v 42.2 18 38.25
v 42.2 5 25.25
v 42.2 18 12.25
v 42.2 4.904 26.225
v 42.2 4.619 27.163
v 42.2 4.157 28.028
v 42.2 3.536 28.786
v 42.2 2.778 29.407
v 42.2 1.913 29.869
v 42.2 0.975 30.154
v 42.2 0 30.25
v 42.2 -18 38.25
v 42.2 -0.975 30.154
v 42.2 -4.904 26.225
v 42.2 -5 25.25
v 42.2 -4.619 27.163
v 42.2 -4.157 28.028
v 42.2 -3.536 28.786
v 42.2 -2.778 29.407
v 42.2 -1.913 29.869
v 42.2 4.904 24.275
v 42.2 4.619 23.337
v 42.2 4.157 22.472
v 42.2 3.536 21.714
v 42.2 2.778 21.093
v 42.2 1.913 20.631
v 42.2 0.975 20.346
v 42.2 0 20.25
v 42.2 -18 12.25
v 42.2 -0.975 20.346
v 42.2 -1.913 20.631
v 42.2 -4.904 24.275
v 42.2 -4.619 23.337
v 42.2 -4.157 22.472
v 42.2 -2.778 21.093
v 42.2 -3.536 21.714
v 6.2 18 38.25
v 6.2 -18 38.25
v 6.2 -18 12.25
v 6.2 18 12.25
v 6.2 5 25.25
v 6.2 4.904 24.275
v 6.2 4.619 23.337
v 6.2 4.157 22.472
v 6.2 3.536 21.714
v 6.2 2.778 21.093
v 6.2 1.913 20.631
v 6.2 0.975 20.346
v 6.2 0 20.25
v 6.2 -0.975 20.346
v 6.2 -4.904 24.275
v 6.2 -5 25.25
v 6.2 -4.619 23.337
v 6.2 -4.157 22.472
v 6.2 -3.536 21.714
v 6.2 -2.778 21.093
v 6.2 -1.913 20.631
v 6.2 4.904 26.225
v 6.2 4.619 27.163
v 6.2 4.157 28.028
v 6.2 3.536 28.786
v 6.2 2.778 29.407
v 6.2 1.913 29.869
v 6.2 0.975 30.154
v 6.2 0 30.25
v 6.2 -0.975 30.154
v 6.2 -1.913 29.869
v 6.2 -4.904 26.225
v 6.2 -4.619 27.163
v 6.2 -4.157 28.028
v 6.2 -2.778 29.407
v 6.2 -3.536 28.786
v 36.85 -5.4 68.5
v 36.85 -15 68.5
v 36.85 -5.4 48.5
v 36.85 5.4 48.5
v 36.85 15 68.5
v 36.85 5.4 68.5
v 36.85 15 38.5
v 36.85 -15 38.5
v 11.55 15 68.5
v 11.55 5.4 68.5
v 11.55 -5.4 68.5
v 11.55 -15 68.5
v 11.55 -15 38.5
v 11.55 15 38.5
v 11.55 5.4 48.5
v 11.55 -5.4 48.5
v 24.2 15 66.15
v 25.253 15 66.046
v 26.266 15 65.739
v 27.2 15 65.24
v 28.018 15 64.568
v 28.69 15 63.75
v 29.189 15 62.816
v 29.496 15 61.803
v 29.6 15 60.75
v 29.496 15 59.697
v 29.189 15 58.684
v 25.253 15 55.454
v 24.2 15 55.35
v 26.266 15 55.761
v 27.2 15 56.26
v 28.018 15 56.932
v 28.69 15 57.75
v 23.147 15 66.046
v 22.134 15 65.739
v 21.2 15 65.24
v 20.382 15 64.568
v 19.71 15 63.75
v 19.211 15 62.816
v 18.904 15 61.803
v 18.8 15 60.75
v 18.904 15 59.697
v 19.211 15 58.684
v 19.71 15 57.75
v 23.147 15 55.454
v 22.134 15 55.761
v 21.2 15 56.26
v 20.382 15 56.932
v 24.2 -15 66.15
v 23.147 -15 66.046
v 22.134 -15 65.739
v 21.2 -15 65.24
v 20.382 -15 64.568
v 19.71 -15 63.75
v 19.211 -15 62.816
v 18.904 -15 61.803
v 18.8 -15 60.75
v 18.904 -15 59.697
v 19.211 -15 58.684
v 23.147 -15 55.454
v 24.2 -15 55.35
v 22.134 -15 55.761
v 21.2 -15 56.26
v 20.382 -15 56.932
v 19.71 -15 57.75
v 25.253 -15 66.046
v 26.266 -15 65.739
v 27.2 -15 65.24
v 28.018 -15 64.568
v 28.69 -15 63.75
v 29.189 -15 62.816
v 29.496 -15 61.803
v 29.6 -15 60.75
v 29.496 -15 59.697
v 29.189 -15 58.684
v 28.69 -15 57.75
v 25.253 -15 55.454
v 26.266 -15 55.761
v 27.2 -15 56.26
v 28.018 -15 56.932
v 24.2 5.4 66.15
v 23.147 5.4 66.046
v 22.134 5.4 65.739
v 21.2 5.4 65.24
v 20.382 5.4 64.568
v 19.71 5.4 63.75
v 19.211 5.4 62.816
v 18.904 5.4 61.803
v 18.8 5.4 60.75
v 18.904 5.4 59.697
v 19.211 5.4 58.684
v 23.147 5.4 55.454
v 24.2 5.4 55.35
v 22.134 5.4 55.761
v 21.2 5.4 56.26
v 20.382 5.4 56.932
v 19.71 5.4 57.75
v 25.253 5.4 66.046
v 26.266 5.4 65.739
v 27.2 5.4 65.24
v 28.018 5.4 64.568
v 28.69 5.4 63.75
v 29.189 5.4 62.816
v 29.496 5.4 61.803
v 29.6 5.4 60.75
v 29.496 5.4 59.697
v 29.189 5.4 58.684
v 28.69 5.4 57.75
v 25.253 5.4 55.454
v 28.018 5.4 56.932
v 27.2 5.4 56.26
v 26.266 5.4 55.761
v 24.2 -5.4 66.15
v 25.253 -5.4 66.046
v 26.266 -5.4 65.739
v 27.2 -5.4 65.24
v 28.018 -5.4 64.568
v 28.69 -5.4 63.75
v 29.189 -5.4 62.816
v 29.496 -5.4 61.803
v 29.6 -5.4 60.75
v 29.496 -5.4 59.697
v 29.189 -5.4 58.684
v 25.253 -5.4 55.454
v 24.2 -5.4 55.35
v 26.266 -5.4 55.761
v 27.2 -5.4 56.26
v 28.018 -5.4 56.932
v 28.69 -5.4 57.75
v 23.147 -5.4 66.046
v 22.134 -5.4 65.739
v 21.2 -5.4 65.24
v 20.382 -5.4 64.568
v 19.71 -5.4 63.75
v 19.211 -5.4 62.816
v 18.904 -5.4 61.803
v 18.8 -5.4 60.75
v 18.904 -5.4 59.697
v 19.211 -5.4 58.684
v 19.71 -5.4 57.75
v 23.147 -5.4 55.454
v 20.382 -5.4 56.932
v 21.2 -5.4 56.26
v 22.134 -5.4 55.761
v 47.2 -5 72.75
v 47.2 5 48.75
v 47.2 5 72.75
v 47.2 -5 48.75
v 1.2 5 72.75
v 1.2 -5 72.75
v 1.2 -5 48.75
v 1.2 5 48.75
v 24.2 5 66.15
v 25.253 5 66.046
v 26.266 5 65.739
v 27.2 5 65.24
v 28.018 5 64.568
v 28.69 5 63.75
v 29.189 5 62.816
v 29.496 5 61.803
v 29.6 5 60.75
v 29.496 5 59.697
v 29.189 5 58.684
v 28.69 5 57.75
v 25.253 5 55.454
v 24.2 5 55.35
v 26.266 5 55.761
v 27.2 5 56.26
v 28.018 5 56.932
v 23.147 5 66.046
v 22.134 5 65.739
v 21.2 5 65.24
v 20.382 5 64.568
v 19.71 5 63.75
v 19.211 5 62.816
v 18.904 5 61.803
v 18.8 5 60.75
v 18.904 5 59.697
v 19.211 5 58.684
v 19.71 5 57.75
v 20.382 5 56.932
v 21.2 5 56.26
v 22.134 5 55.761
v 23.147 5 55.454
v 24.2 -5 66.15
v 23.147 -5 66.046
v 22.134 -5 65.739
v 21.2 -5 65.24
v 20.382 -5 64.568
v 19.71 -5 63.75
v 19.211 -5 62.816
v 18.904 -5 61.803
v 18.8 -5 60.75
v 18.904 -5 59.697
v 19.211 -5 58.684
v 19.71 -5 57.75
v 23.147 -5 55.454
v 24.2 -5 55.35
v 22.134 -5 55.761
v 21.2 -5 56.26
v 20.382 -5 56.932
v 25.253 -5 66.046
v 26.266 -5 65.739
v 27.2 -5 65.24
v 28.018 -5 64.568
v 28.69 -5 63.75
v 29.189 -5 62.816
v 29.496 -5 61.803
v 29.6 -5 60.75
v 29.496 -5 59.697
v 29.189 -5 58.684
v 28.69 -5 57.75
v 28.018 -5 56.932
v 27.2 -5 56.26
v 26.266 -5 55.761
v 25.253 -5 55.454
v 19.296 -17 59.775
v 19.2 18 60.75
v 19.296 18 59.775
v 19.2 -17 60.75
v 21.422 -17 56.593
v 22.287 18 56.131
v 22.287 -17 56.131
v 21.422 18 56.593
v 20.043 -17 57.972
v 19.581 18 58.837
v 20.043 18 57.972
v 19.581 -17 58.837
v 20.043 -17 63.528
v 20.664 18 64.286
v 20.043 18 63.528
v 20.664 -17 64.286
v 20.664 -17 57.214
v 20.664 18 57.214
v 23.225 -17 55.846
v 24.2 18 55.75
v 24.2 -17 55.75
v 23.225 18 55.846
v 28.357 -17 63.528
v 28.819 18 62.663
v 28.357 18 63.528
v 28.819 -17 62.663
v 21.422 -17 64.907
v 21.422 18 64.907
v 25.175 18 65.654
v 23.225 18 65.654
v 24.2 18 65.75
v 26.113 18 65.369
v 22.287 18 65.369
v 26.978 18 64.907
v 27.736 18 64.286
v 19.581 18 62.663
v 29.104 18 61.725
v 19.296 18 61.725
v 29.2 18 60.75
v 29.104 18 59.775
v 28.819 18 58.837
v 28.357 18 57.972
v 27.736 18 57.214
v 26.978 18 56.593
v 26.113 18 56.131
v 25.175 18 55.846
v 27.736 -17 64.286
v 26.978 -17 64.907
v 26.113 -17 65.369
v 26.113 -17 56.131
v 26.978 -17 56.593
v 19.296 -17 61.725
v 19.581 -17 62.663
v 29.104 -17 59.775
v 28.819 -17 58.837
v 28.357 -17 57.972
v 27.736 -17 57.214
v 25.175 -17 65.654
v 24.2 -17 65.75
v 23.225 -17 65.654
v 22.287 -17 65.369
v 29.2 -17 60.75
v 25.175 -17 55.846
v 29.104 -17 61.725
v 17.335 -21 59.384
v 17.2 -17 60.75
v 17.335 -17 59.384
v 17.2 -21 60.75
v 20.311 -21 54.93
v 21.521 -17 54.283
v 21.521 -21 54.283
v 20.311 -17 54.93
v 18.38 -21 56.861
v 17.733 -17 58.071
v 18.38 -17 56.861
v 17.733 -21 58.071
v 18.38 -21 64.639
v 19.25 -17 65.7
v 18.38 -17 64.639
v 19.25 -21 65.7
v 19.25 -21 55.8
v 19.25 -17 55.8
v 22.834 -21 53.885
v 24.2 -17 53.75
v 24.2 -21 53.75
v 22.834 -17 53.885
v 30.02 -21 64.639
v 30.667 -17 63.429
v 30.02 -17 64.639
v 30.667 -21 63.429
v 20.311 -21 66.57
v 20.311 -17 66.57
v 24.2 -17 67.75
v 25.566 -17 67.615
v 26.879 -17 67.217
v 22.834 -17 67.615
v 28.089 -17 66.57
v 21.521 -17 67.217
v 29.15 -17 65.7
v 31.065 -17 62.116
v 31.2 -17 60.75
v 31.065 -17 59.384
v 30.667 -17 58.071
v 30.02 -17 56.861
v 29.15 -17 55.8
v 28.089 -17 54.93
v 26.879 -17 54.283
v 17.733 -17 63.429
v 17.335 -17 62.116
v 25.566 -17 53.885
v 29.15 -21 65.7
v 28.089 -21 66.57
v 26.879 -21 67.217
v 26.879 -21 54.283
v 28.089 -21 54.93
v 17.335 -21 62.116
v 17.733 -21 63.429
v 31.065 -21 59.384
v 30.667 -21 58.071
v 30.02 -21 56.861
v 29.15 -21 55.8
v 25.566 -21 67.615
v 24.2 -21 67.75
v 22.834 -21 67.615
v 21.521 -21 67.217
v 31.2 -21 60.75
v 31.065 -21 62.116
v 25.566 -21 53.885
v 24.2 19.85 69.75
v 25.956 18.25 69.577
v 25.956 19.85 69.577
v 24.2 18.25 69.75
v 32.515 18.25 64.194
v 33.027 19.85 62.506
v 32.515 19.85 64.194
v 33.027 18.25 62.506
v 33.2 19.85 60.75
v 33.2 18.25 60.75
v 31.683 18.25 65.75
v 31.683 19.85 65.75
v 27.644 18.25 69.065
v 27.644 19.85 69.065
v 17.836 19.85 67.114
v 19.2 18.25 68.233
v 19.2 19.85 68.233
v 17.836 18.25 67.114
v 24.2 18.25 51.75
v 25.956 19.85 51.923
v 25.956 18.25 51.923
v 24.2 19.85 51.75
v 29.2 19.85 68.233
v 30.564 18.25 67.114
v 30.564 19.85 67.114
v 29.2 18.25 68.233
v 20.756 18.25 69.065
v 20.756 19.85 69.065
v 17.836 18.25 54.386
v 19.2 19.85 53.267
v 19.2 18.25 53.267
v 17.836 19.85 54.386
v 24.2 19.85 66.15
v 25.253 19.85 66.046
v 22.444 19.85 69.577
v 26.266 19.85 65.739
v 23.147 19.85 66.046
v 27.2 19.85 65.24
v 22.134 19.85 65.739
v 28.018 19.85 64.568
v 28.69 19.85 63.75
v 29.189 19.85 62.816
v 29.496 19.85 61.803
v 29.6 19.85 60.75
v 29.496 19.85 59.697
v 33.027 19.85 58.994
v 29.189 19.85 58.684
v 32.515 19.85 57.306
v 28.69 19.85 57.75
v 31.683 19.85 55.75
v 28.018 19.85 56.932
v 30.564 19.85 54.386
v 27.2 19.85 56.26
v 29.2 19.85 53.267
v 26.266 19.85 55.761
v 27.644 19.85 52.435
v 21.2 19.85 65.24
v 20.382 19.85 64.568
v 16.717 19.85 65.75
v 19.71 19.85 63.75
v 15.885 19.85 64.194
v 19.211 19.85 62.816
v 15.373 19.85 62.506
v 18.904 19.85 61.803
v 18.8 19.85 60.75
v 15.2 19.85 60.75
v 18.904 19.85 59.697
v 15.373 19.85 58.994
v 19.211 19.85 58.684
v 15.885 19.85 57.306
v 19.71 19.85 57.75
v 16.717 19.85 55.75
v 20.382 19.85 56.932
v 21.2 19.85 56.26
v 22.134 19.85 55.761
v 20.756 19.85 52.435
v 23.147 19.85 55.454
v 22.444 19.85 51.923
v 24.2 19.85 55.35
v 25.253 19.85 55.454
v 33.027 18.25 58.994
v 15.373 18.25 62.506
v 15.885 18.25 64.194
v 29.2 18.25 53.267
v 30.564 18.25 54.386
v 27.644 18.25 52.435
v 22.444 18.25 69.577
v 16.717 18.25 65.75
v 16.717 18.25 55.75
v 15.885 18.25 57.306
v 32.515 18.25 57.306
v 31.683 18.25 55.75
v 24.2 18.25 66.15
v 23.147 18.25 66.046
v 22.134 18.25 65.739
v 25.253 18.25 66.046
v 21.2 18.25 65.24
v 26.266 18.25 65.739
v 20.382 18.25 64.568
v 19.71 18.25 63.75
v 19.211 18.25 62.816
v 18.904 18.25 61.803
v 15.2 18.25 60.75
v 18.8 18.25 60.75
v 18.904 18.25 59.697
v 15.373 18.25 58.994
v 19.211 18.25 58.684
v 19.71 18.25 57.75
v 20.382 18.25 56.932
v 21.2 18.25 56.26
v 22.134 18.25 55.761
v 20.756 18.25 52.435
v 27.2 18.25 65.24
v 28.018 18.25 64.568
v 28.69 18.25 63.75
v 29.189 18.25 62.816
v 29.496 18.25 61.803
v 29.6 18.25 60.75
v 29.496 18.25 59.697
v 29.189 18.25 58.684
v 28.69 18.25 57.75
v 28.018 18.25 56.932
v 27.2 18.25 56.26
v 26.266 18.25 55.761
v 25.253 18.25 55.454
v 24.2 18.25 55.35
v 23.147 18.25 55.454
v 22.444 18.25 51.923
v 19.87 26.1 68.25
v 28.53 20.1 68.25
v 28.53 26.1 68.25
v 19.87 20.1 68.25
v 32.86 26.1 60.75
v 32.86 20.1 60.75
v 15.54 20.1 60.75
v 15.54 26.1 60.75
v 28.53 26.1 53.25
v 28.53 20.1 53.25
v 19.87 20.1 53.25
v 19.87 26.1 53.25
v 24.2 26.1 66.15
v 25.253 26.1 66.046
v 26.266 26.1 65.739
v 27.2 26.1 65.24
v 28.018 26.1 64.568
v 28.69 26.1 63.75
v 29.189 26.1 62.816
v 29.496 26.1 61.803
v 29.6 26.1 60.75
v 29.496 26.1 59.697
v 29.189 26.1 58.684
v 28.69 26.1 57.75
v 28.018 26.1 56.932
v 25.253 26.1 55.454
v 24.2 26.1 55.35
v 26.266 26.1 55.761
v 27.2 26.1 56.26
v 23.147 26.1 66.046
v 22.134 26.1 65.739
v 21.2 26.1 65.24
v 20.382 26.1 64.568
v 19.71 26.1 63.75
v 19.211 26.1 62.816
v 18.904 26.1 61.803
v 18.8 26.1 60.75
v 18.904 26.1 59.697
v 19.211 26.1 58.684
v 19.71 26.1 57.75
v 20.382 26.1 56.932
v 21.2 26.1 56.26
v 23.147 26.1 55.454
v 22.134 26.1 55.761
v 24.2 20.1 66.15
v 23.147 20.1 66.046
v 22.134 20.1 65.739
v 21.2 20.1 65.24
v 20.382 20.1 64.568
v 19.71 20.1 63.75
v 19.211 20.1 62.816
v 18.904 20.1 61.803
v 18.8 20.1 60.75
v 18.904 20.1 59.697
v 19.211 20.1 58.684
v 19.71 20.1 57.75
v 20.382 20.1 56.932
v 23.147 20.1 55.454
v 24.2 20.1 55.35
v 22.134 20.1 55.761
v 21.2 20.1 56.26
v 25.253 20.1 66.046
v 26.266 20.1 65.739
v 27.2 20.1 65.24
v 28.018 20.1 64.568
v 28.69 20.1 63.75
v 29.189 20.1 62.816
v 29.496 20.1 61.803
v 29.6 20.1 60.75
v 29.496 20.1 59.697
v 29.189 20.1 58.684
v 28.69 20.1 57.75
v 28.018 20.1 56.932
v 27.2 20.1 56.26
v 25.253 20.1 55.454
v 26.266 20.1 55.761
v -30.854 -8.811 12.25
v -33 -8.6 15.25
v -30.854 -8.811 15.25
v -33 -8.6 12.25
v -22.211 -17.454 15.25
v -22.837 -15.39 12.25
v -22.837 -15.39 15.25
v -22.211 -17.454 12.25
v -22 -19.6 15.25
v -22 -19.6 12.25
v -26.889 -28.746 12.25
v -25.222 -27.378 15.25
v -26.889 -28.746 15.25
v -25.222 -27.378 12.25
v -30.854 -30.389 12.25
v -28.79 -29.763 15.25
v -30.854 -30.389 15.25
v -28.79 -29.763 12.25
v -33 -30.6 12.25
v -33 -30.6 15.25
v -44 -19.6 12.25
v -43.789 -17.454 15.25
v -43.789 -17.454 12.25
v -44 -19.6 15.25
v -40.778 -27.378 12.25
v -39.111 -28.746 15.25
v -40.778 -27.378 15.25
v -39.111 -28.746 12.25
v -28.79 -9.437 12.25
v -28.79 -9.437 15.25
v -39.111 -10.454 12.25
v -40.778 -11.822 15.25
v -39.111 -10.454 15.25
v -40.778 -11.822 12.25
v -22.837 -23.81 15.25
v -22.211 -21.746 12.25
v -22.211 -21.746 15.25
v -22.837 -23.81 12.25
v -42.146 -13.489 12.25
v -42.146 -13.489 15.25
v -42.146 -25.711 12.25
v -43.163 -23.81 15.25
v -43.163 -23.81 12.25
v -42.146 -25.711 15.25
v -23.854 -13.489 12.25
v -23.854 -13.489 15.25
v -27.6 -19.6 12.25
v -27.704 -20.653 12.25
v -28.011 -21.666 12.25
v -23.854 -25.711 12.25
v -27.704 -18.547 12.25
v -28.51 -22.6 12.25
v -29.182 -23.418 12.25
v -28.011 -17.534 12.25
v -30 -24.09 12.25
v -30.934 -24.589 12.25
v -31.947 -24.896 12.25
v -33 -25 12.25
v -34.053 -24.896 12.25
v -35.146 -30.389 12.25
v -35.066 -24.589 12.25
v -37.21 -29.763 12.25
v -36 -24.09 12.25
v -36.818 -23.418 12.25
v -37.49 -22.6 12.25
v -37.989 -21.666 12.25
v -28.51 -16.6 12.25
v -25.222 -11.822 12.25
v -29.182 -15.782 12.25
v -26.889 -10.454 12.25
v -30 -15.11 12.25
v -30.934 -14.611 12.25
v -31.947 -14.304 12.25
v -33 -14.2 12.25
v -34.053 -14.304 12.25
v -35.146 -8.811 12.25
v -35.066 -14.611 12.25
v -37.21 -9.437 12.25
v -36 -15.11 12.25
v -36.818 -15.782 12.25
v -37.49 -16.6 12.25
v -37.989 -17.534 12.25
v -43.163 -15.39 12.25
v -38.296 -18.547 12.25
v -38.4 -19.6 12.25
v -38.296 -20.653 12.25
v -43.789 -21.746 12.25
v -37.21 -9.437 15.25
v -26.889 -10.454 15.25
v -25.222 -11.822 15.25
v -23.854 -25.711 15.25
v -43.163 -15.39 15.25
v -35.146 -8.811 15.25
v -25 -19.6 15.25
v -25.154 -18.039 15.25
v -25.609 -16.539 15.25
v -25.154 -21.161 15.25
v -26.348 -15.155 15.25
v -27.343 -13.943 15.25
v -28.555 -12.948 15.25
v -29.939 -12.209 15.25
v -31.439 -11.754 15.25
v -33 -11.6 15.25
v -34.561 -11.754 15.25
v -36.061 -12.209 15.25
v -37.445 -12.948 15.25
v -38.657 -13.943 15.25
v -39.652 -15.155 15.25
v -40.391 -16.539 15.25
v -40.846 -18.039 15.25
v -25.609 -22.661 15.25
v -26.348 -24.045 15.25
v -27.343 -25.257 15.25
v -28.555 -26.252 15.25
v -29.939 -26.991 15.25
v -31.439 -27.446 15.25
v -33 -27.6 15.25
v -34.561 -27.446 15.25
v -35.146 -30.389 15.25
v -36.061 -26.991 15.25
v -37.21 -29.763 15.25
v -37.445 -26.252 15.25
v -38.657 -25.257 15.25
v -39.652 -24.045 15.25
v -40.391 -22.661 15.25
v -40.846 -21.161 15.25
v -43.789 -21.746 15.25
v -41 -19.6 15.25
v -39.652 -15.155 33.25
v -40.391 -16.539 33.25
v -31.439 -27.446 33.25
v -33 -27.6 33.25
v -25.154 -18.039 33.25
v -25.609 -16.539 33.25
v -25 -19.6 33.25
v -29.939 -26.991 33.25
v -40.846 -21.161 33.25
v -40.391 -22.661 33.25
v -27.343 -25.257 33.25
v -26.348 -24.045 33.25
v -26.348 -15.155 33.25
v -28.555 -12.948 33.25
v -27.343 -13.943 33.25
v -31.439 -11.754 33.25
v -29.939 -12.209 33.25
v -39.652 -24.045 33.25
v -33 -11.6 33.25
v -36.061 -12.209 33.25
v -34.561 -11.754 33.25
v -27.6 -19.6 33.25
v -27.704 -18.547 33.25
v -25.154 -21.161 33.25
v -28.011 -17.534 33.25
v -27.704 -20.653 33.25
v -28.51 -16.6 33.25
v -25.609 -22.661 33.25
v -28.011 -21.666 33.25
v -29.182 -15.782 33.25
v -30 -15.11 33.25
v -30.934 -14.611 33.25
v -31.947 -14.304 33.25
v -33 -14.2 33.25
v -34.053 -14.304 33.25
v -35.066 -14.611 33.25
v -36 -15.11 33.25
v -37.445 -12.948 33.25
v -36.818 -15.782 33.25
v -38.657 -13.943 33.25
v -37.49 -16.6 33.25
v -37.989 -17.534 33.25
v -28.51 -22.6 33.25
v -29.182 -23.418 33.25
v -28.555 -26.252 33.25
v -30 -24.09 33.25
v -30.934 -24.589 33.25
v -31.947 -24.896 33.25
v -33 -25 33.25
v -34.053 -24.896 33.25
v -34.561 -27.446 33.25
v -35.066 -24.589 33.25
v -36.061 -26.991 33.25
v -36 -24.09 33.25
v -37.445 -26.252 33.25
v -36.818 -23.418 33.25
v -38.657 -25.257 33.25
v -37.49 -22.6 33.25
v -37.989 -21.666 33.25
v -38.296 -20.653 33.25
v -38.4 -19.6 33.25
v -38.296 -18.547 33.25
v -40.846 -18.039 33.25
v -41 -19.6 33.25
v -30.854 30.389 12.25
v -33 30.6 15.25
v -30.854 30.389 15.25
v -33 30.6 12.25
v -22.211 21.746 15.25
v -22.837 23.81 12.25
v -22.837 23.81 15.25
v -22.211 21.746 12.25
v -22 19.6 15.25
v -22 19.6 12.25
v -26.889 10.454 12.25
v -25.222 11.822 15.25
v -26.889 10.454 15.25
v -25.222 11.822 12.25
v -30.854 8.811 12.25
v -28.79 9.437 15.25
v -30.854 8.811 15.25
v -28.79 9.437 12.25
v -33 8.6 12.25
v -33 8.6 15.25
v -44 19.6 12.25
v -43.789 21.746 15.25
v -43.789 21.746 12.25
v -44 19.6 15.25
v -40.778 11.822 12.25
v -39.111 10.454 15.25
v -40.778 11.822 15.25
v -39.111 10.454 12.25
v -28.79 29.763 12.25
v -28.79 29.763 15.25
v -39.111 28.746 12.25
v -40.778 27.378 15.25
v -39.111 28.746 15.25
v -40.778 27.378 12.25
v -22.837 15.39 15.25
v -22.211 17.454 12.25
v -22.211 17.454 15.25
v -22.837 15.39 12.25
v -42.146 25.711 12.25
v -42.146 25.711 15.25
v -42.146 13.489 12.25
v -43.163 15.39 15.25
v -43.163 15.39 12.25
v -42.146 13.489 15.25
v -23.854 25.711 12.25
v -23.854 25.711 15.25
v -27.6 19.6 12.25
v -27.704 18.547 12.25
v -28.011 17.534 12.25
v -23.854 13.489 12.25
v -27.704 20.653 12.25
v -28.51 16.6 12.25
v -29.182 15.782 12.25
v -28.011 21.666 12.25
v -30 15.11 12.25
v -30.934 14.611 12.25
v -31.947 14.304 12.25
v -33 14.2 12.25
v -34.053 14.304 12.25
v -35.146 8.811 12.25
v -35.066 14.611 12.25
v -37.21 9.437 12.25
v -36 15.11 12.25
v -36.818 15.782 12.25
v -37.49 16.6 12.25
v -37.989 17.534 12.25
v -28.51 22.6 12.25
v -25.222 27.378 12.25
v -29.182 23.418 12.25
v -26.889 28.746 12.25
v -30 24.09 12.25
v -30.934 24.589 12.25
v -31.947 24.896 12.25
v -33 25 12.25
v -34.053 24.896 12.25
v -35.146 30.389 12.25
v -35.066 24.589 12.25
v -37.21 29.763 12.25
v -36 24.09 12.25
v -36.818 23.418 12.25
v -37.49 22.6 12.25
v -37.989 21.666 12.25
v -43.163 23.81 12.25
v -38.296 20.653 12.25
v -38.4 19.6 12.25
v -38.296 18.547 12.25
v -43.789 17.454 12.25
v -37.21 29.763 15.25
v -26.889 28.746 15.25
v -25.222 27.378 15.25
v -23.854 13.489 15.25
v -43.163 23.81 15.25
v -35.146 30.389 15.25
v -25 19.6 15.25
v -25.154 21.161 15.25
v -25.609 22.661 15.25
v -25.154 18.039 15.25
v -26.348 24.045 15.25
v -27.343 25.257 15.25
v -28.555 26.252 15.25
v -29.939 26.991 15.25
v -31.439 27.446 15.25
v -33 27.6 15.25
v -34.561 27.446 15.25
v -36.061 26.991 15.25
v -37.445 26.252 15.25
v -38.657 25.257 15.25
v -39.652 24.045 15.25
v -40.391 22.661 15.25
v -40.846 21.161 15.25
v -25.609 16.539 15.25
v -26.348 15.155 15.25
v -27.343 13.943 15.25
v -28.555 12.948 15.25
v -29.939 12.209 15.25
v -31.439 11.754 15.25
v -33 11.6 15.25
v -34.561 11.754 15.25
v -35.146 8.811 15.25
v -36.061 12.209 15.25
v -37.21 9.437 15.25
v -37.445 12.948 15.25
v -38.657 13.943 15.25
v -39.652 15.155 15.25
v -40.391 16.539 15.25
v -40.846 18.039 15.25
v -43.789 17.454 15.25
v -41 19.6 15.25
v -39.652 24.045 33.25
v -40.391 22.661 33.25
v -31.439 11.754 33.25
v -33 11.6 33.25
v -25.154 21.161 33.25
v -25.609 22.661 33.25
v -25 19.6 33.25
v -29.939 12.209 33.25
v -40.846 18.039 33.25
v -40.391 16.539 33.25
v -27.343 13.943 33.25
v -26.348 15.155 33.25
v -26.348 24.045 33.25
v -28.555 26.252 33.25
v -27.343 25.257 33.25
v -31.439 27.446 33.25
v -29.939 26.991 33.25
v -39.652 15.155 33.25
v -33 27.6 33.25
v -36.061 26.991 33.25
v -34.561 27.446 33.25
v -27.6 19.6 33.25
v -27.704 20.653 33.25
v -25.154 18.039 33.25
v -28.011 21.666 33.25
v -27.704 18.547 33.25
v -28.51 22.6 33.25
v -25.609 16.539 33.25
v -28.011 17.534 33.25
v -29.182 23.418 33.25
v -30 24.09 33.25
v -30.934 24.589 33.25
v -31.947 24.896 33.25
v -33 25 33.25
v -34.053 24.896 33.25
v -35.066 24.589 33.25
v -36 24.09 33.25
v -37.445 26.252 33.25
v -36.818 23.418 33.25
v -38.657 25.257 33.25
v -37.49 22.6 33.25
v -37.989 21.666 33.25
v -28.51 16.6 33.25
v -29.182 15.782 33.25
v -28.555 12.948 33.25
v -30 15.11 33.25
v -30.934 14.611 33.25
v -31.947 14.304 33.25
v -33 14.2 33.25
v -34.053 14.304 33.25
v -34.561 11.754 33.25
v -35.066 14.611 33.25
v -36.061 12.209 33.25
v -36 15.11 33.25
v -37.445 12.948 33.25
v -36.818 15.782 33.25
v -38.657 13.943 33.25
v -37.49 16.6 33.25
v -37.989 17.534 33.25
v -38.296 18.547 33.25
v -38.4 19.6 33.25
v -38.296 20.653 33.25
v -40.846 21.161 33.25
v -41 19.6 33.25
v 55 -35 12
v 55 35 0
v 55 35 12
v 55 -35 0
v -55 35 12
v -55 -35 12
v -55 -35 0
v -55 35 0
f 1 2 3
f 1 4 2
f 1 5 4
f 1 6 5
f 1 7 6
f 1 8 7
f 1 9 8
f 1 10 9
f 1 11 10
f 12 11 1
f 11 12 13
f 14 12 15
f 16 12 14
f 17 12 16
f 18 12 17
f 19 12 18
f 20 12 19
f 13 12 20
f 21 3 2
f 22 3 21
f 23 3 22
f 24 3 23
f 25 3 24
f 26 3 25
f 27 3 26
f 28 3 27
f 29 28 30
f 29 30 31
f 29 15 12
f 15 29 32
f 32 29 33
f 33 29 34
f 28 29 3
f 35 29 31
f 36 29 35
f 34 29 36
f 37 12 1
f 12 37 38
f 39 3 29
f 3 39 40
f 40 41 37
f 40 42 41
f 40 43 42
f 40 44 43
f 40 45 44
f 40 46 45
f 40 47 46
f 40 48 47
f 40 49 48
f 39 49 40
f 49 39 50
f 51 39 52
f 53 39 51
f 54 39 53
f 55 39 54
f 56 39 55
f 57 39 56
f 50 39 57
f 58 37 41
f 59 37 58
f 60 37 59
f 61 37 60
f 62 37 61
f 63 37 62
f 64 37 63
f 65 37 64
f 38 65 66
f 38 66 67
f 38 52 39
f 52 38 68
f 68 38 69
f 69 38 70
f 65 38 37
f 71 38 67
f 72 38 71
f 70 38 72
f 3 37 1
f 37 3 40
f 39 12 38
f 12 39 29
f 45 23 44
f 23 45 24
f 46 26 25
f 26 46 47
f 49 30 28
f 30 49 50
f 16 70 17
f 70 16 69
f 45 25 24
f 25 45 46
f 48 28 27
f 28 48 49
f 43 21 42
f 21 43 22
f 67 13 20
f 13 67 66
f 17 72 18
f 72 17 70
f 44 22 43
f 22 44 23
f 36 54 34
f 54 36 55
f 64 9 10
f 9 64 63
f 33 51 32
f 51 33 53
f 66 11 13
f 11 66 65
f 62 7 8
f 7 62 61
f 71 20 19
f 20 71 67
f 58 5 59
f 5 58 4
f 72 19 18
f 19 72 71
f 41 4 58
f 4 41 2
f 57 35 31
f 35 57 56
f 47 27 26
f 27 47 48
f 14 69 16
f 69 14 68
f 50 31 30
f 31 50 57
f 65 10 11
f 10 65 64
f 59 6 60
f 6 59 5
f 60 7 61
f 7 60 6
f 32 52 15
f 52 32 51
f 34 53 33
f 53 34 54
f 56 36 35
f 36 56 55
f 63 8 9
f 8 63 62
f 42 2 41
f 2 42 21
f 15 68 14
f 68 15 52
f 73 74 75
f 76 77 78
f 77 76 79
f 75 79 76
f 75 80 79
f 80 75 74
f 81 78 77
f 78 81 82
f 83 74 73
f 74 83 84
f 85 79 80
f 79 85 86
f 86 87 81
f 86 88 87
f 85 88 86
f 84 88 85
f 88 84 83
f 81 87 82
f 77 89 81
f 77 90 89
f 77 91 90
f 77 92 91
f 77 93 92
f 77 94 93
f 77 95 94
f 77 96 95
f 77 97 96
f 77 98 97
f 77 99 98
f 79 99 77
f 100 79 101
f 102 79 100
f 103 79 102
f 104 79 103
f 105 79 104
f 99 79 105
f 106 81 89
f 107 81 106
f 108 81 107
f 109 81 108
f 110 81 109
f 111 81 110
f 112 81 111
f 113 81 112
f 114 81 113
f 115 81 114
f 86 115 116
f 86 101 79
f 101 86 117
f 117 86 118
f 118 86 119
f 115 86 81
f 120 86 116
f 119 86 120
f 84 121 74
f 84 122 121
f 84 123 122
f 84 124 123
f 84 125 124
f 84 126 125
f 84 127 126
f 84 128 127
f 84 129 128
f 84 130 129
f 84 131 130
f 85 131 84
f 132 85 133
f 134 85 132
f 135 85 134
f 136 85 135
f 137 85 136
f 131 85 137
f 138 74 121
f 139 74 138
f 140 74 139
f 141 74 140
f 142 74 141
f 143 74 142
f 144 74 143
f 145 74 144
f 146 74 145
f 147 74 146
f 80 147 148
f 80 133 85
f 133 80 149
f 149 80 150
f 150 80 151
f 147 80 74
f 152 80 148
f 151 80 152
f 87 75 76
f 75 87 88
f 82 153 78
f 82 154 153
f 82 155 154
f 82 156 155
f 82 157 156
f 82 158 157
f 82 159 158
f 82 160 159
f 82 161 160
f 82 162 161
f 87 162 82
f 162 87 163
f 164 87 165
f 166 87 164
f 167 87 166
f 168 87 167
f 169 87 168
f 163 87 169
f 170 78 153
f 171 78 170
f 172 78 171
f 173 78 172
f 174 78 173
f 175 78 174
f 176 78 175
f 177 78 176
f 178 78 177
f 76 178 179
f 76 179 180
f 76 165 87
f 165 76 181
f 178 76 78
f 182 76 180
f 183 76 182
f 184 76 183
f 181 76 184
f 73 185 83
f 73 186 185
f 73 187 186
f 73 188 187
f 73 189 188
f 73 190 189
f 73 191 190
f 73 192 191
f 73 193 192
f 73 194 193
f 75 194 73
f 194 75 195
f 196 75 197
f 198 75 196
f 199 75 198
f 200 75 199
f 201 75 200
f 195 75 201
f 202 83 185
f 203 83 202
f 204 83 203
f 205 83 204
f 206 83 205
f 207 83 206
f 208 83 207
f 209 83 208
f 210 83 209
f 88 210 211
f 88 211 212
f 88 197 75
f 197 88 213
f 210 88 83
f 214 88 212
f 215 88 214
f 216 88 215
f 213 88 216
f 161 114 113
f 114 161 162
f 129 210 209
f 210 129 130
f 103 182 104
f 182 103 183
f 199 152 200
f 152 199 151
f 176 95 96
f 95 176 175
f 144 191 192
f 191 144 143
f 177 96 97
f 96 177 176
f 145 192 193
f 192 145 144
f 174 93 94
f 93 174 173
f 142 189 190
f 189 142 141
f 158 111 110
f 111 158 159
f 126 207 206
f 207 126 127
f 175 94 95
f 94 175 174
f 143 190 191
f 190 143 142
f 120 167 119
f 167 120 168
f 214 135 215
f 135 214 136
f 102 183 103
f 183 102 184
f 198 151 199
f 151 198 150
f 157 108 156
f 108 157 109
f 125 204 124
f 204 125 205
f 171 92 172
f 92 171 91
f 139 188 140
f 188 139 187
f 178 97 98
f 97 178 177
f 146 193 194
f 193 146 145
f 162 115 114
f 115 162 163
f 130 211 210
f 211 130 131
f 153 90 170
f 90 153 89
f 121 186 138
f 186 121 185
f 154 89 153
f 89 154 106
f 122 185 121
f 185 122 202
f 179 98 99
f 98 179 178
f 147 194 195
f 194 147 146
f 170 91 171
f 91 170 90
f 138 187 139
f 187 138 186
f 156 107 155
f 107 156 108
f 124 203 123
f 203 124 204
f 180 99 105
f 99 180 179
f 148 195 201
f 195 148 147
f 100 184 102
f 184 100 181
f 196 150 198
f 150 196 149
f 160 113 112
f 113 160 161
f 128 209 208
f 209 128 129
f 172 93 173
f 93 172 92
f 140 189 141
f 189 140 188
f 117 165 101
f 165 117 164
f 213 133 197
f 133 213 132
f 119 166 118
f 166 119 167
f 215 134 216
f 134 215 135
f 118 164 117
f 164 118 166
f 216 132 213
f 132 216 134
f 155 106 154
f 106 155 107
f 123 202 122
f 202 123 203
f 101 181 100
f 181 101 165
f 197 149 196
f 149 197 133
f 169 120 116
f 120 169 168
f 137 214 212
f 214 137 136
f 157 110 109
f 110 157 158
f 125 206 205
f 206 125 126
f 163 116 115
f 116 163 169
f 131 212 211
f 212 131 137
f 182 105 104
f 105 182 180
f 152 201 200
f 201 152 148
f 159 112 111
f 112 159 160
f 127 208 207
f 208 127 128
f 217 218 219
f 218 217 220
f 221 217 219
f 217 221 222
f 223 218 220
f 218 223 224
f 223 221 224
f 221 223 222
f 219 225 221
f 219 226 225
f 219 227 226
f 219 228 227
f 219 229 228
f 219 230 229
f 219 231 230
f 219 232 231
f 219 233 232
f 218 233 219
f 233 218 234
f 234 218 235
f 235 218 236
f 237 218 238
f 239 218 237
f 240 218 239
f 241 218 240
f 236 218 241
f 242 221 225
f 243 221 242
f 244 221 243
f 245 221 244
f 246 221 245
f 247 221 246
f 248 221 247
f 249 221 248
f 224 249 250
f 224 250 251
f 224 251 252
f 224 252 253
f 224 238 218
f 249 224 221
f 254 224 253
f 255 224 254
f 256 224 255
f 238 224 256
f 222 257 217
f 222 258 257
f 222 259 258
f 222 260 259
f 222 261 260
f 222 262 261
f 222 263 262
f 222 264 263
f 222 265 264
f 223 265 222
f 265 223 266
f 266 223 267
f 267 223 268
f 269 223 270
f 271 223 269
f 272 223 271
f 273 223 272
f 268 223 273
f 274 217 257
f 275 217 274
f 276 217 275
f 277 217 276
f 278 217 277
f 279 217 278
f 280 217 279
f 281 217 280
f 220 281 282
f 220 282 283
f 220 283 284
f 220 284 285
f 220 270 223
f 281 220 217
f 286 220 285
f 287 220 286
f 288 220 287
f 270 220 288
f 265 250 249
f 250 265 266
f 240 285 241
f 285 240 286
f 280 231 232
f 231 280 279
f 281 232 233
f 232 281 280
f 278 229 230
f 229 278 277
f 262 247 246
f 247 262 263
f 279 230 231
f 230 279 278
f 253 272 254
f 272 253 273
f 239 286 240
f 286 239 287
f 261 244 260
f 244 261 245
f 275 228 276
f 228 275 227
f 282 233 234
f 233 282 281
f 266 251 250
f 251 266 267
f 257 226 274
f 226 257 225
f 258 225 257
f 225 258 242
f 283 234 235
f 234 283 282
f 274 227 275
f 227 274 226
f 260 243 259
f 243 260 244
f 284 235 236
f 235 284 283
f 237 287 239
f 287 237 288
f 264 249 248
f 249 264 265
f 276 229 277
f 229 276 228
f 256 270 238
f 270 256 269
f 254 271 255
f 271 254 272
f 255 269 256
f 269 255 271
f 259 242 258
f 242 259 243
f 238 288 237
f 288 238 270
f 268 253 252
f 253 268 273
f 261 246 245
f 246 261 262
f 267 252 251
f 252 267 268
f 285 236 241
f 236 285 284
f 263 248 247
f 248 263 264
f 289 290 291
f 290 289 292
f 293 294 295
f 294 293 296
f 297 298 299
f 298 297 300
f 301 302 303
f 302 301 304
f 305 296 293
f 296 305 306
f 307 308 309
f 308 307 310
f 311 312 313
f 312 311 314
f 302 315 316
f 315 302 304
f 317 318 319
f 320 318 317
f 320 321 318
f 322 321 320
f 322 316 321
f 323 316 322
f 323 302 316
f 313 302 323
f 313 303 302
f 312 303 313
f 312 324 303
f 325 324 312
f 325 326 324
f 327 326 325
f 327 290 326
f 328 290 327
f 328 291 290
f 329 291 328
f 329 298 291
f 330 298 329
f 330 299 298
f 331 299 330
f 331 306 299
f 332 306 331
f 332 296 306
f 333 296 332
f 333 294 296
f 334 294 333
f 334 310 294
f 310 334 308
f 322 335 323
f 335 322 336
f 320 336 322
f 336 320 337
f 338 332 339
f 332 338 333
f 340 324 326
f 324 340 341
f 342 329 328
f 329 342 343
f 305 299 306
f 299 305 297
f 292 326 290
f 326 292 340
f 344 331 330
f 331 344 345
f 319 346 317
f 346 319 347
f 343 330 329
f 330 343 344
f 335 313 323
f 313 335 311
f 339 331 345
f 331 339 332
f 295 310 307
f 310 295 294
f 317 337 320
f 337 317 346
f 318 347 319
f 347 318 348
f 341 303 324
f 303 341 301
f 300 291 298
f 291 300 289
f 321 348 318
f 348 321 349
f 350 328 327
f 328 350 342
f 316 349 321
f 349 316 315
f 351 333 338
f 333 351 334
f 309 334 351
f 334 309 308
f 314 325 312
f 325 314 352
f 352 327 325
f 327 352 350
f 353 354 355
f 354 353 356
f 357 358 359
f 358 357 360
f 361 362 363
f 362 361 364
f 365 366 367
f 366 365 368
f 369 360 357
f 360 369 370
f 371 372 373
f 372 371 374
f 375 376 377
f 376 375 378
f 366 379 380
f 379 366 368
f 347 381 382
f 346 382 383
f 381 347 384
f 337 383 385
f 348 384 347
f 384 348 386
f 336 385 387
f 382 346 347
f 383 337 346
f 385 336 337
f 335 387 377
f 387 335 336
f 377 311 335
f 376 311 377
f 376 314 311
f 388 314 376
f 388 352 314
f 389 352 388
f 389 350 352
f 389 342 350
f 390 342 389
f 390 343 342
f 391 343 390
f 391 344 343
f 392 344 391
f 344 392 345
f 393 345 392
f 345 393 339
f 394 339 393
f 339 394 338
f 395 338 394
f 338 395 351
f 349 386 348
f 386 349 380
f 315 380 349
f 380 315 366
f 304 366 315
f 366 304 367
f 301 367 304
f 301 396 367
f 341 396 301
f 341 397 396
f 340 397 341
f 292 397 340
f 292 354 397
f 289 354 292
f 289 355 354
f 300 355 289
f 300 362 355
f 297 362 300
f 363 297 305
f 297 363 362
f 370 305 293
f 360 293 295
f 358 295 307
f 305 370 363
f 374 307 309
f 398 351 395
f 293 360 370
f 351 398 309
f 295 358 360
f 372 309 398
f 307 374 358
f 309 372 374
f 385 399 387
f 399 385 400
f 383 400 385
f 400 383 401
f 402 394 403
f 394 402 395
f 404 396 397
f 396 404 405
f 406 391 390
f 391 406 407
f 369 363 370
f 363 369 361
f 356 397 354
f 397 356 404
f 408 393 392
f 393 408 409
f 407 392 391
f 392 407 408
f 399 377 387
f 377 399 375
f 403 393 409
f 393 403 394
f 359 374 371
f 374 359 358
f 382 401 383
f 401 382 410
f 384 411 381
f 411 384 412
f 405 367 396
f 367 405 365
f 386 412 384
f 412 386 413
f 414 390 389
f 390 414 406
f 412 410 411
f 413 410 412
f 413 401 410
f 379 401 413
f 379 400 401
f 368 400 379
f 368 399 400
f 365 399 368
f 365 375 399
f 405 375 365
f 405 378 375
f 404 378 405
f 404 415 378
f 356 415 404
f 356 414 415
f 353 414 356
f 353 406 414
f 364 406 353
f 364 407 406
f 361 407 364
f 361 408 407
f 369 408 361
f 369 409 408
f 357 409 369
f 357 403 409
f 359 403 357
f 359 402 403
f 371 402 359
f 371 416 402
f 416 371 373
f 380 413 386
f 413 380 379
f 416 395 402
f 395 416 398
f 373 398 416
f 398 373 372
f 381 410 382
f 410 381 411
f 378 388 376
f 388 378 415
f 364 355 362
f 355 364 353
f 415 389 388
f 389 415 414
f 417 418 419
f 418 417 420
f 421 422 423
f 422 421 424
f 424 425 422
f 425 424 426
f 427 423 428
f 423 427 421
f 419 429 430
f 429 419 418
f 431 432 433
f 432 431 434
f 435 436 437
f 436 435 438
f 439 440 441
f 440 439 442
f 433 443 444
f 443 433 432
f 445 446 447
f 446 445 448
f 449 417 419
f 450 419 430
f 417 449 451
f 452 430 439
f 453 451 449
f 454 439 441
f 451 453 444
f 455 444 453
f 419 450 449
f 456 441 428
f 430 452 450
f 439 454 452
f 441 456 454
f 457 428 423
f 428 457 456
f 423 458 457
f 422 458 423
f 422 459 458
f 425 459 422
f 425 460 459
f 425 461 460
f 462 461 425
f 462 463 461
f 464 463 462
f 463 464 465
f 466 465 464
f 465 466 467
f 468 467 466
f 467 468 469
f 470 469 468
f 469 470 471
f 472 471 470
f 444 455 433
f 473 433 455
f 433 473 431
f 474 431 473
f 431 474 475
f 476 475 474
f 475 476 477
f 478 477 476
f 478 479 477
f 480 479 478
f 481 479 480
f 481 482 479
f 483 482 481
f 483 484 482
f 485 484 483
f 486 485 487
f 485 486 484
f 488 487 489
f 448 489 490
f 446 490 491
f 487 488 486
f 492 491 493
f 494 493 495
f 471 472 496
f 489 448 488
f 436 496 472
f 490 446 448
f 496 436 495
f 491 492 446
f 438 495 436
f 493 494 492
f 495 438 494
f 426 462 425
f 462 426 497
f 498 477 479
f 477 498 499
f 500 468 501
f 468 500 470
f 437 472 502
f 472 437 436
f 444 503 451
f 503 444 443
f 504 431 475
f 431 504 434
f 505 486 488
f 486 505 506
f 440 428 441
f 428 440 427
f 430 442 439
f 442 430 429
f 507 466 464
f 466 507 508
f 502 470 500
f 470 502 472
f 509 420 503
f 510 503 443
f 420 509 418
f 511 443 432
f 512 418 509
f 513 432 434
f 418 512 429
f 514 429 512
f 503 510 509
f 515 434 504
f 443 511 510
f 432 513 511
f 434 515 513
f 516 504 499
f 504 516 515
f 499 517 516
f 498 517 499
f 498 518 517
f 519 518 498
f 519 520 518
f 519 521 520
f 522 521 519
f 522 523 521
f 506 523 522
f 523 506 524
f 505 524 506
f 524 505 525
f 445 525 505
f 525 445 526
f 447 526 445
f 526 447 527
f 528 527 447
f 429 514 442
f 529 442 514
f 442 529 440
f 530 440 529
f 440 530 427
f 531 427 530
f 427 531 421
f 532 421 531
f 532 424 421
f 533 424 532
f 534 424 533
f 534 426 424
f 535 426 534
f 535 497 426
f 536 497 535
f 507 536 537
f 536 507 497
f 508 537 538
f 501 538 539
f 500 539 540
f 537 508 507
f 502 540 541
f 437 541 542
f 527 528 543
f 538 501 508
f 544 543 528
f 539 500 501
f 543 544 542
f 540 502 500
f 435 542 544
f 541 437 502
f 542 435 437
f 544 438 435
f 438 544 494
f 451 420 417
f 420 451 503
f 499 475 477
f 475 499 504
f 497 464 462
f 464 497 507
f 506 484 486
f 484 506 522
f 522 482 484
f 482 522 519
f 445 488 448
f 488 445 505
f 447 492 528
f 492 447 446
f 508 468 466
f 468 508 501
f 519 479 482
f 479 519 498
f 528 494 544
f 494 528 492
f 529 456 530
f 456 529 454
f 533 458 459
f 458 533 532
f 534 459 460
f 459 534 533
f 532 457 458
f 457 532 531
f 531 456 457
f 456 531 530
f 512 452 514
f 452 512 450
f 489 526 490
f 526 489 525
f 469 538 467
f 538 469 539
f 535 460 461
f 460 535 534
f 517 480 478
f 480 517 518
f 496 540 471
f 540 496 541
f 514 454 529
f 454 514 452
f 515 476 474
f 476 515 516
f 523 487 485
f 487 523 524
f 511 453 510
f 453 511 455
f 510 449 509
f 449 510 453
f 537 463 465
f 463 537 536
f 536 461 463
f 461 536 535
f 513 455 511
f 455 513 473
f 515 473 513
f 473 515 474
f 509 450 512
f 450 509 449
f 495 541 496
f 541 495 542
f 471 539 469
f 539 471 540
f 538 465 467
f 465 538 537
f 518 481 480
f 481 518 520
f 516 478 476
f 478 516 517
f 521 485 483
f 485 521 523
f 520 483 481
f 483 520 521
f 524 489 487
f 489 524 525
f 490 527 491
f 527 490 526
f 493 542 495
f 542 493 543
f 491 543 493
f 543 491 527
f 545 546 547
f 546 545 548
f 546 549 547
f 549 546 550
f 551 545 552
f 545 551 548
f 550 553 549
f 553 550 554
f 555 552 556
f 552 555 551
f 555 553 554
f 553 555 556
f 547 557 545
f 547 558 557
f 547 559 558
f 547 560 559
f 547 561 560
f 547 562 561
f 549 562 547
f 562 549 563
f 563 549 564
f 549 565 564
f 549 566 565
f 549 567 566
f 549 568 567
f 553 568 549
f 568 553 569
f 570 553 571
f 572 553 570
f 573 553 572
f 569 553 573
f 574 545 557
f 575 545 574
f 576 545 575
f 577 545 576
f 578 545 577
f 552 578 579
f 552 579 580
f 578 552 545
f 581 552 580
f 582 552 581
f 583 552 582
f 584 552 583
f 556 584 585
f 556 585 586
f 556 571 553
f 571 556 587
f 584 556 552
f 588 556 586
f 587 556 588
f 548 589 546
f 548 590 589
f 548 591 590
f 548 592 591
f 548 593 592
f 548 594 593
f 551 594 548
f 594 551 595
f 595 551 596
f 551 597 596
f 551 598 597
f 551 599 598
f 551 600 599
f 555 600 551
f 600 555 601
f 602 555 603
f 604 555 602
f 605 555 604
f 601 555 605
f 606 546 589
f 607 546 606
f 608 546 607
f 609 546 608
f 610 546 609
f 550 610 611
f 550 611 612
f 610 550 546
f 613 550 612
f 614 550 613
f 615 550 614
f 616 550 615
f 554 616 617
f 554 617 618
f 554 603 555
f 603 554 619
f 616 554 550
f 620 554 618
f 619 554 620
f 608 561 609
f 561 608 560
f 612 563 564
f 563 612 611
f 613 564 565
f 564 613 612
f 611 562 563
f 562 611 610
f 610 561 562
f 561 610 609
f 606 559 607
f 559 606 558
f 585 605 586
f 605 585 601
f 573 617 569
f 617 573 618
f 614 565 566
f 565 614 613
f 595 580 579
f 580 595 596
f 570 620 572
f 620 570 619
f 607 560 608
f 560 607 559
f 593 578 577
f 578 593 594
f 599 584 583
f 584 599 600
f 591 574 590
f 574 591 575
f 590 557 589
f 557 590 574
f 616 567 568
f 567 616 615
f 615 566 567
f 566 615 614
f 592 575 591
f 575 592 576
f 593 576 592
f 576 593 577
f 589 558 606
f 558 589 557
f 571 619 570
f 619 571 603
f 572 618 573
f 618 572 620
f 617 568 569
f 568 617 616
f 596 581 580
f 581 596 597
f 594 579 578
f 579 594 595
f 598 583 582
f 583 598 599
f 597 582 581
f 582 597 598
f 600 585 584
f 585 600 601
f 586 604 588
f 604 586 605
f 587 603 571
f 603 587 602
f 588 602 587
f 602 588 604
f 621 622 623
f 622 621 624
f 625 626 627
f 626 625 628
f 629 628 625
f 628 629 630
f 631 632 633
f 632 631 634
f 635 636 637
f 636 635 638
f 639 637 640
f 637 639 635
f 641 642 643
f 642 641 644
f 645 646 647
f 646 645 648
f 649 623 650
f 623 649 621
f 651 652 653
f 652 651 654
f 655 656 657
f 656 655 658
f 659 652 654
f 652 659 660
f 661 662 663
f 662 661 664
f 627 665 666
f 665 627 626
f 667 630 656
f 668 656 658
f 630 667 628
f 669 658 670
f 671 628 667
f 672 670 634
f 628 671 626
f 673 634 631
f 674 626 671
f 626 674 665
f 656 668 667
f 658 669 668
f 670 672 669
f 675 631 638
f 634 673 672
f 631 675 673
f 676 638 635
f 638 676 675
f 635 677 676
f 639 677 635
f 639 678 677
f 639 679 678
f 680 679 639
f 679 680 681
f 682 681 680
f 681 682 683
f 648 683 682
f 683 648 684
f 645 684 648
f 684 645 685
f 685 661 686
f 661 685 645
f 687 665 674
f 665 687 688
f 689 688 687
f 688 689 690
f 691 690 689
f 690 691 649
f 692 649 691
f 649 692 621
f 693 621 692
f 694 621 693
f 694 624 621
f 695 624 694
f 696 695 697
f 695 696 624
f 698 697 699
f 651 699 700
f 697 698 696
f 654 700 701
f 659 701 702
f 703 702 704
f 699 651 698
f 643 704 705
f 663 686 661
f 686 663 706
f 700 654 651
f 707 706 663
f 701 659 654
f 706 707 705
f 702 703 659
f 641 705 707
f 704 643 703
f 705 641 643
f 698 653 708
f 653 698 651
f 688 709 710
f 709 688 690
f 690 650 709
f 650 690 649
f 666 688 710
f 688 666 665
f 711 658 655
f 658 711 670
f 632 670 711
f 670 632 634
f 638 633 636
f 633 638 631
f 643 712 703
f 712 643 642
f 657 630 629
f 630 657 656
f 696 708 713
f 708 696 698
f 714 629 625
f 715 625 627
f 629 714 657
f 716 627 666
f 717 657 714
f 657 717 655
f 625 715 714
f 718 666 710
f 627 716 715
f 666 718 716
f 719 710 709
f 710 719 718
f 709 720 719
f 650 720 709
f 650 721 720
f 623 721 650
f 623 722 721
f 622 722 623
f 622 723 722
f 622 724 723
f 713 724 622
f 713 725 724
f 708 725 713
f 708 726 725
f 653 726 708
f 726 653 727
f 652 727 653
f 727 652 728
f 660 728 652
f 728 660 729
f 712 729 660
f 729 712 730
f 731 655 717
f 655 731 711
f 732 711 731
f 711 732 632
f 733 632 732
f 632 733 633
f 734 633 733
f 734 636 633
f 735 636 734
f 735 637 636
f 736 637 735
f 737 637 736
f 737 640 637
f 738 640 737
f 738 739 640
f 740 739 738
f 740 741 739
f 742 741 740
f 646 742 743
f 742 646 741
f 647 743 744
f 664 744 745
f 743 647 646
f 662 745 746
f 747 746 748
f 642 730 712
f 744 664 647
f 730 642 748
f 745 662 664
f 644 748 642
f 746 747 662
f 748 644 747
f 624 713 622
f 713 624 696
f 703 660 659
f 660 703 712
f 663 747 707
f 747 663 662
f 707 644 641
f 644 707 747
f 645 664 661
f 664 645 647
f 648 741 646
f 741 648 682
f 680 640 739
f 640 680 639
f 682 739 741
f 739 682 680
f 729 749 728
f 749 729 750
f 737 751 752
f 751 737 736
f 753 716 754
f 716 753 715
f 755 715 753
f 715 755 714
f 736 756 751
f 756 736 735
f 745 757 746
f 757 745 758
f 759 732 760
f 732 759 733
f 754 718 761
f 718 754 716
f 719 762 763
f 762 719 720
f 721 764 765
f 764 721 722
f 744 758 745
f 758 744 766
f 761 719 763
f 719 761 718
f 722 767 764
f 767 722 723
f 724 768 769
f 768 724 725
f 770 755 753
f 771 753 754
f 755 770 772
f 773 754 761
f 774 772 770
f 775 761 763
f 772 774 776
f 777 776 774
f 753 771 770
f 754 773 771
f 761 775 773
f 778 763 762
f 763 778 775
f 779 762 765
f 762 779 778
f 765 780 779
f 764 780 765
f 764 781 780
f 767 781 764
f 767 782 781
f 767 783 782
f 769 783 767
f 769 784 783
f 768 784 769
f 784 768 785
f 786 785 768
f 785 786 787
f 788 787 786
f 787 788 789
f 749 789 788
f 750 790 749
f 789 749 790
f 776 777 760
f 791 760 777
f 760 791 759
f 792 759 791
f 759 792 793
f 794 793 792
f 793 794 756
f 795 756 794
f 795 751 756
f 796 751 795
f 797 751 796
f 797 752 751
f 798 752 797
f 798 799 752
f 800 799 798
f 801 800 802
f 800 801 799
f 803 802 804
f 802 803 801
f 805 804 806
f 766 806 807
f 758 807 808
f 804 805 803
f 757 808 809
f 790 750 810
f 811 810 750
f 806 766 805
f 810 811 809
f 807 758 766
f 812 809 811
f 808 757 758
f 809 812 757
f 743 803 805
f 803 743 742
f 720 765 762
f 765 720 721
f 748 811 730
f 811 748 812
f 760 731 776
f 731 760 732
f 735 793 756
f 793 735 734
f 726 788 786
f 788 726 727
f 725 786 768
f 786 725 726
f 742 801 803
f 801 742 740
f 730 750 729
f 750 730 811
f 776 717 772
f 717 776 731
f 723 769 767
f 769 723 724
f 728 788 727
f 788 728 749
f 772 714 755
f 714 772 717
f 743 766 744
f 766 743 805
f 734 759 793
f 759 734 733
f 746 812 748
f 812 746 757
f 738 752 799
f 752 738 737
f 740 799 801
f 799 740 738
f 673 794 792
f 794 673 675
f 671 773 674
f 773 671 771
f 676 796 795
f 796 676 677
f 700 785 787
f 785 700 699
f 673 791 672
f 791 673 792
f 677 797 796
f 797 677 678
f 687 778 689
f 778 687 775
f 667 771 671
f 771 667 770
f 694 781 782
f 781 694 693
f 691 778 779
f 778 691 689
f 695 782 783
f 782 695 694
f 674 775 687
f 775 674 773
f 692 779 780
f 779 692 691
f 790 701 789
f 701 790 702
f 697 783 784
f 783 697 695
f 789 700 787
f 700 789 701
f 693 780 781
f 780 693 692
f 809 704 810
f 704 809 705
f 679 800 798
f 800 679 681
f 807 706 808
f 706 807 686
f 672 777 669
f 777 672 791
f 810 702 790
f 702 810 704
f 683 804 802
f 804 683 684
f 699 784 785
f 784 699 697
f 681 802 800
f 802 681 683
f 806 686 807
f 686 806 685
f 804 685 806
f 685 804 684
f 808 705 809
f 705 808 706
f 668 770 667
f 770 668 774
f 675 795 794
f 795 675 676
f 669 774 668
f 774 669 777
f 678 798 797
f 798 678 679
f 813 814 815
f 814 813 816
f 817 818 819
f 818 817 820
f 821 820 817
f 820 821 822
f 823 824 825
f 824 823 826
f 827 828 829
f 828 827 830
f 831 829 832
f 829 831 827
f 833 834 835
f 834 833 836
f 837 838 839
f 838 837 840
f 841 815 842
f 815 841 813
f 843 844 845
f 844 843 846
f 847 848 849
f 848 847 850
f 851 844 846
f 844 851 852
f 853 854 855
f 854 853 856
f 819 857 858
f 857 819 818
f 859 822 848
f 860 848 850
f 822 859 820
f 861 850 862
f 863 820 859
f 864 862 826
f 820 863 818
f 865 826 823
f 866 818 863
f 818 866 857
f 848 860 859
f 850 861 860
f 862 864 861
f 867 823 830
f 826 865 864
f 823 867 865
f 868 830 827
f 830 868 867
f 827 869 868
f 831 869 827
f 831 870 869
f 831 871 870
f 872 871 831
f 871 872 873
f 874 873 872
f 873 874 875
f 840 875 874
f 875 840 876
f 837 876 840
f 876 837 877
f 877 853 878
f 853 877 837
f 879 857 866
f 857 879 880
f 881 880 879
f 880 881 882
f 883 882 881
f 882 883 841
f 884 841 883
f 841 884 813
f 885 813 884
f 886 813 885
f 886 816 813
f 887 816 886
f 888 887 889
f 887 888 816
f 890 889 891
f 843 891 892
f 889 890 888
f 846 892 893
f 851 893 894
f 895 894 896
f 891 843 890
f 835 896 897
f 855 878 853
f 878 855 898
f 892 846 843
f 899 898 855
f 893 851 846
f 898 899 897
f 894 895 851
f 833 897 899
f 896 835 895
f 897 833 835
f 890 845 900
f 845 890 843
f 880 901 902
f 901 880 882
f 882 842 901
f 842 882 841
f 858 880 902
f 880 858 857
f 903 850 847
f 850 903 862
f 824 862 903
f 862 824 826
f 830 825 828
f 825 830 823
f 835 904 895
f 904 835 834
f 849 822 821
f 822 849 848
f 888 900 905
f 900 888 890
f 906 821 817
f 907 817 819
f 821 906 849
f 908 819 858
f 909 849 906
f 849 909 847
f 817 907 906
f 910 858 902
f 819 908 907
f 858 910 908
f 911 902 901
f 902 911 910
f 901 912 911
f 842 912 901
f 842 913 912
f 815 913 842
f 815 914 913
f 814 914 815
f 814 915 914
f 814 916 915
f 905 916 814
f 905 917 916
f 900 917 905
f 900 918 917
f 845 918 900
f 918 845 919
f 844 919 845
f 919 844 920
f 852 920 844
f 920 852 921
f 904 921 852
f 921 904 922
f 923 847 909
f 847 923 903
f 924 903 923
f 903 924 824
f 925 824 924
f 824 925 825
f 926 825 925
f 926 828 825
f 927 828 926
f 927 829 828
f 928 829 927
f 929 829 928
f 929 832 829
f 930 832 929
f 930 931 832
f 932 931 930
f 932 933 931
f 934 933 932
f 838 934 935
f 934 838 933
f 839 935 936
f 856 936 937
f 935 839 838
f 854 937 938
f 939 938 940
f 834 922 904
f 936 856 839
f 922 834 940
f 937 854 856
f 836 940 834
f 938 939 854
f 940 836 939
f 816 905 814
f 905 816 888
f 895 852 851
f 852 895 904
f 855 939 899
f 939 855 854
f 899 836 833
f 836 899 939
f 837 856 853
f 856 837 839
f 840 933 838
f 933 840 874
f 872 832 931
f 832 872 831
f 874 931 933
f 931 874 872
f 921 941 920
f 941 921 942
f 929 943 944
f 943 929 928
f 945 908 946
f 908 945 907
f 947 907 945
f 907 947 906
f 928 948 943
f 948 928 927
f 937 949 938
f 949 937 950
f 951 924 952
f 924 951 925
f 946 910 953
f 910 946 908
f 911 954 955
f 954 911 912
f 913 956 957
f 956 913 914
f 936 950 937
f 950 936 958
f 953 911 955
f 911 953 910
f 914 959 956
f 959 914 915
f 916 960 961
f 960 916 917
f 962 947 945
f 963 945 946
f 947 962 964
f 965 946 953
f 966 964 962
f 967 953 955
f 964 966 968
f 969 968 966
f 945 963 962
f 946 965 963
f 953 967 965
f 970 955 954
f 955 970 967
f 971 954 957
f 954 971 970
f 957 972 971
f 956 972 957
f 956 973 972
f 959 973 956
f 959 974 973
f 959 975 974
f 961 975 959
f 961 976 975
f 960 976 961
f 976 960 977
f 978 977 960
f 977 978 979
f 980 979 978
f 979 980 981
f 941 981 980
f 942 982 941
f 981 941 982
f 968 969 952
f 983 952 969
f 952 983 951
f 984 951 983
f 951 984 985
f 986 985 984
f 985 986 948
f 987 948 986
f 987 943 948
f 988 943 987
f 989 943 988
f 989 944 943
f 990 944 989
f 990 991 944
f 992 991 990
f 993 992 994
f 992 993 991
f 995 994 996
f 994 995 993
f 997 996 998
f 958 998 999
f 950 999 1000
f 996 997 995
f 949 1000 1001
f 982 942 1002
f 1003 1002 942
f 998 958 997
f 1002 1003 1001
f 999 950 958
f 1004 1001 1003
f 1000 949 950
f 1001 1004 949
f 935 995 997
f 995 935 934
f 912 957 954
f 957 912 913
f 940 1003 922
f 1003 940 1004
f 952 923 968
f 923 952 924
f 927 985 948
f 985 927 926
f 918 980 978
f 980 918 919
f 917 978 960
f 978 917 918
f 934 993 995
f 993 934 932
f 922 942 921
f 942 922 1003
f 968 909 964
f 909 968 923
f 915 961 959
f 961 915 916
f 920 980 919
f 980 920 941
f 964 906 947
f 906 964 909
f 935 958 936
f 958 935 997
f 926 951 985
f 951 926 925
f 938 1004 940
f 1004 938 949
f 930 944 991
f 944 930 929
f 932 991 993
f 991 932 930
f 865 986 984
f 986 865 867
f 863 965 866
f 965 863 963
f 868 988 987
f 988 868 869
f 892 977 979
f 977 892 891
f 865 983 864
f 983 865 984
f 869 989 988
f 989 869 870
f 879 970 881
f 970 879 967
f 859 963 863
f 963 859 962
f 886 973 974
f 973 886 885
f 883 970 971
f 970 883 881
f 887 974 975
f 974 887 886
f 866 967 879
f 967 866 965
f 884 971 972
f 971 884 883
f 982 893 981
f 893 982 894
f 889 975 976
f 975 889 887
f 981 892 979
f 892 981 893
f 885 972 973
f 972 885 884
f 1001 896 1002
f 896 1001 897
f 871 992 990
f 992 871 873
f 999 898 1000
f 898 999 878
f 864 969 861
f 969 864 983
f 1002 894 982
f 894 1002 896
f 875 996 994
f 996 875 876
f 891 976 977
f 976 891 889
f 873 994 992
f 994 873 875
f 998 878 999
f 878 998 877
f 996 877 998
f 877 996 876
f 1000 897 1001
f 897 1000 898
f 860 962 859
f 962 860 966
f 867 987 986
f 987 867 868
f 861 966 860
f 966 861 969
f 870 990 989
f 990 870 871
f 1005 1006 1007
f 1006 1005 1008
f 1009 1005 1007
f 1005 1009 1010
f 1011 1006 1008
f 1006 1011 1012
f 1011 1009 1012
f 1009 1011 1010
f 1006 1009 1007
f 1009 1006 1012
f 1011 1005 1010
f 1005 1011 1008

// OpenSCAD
$fn = 32;

// ------------------------------------------------------------------------
// Indexing jig: plate 110 x 70 mm, pin d10
// Every part is its own module, assembly() places every instance.
// ------------------------------------------------------------------------

// --- part 1 ---
module jig_plate() {
  difference() {
    translate([-55, -35, 0]) cube([110, 70, 12]);
  }
}

// --- part 2 ---
module locator_block() {
  difference() {
    translate([-18, -18, 0]) cube([36, 36, 26]);
    translate([0, 0, 13]) rotate([0, 90, 0]) cylinder(h = 38, d = 10, center = true);
  }
}

// --- part 3 ---
module index_fork() {
  difference() {
    translate([-12.65, -15, 0]) cube([25.3, 30, 30]);
    translate([-13.65, -5.4, 10]) cube([27.3, 10.8, 21]);
    translate([0, 0, 22.25]) rotate([90, 0, 0]) cylinder(h = 32, d = 10.8, center = true);
  }
}

// --- part 4 ---
module index_arm() {
  difference() {
    translate([-23, -5, 0]) cube([46, 10, 24]);
    translate([0, 0, 12]) rotate([90, 0, 0]) cylinder(h = 12, d = 10.8, center = true);
  }
}

// --- part 5 ---
module index_pin() {
  rotate([0, 90, 0]) cylinder(h = 36, d = 10, center = true);
  translate([-21, 0, 0]) rotate([0, 90, 0]) cylinder(h = 4, d = 14);
}

// --- part 6 ---
module pin_washer() {
  difference() {
      translate([0, 0, 0]) cylinder(h = 1.6, d = 18);
      translate([0, 0, -1]) cylinder(h = 3.6, d = 10.8);
    }
}

// --- part 7 ---
module lock_nut() {
  difference() {
    linear_extrude(height = 6) polygon(points = [[8.66, 0], [4.33, 7.5], [-4.33, 7.5], [-8.66, 0], [-4.33, -7.5], [4.33, -7.5]]);
    translate([0, 0, -1]) cylinder(h = 8, d = 10.8);
  }
}

// --- part 8 ---
module guide_bush_a() {
  difference() {
    union() {
      cylinder(h = 3, d = 22);
      translate([0, 0, 3]) cylinder(h = 18, d = 16);
    }
    translate([0, 0, -1]) cylinder(h = 23, d = 10.8);
  }
}

// --- part 9 ---
module guide_bush_b() {
  difference() {
    union() {
      cylinder(h = 3, d = 22);
      translate([0, 0, 3]) cylinder(h = 18, d = 16);
    }
    translate([0, 0, -1]) cylinder(h = 23, d = 10.8);
  }
}

// --- assembly ---
module assembly() {
  color([0.80, 0.24, 0.20]) translate([0, 0, 0]) rotate([0, 0, 0]) jig_plate();
  color([0.20, 0.45, 0.75]) translate([24.2, 0, 12.25]) rotate([0, 0, 0]) locator_block();
  color([0.25, 0.62, 0.32]) translate([24.2, 0, 38.5]) rotate([0, 0, 0]) index_fork();
  color([0.92, 0.70, 0.18]) translate([24.2, 0, 48.75]) rotate([0, 0, 0]) index_arm();
  color([0.58, 0.35, 0.70]) translate([24.2, 0, 60.75]) rotate([0, 0, 90]) index_pin();
  color([0.16, 0.66, 0.66]) translate([24.2, 19.85, 60.75]) rotate([90, 0, 0]) pin_washer();
  color([0.85, 0.48, 0.18]) translate([24.2, 26.1, 60.75]) rotate([90, 0, 0]) lock_nut();
  color([0.55, 0.60, 0.65]) translate([-33, -19.6, 12.25]) rotate([0, 0, 0]) guide_bush_a();
  color([0.75, 0.30, 0.55]) translate([-33, 19.6, 12.25]) rotate([0, 0, 0]) guide_bush_b();
}

assembly();
